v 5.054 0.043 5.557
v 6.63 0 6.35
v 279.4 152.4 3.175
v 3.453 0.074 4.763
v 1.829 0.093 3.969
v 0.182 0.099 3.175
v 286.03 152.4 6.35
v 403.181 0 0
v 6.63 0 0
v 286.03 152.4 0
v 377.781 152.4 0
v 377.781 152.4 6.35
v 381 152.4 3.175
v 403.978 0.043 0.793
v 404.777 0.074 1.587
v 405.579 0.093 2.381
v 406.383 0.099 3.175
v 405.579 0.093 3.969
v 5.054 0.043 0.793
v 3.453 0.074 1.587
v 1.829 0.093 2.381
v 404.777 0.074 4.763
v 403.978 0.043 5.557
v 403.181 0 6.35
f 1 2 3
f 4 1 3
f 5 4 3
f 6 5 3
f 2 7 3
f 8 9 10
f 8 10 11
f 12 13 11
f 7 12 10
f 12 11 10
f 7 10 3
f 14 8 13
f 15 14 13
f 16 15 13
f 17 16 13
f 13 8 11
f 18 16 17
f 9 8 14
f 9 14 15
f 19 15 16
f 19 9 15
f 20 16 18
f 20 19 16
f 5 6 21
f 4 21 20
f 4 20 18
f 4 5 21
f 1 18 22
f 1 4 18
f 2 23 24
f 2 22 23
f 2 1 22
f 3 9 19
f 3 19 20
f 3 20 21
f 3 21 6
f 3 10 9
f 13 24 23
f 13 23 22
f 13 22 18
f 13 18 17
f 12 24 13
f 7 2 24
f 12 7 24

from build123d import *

# Parameters (mm, degrees)
BOSS_EXTRUDE1_DEPTH     = 6.35
CHAMFER1_SIZE           = 3.175
CUT_EXTRUDE1_DEPTH      = 421.64
CUT_EXTRUDE1_DEPTH_BACK = 27.432
SKETCH2_R               = 50.8


with BuildPart() as part:
    # Sketch1 → Boss-Extrude1 (new body)
    with BuildSketch(Plane.XY):
        Polygon((279.4, 152.4), (0, 0), (279.4, 0), align=None)
        Polygon((279.4, 152.4), (279.4, 0), (406.4, 0), (381, 152.4), align=None)
    extrude(amount=BOSS_EXTRUDE1_DEPTH)

    # Chamfer1
    chamfer1_edges = [part.edges().sort_by_distance(p)[0] for p in [
        (393.7, 76.2, 6.35),
        (393.7, 76.2, 0),
        (139.7, 76.2, 0),
        (139.7, 76.2, 6.35),
    ]]
    chamfer(chamfer1_edges, length=CHAMFER1_SIZE - 0.0001)  # a hair under: the kernel refuses the full size

    # Sketch2 → Cut-Extrude1 (cut, two sides: drawn at the far end of the back side and taken through both)
    with BuildSketch(Plane(origin=(0, 0, 0), x_dir=(0, 0, -1), z_dir=(1, 0, 0)).offset(-CUT_EXTRUDE1_DEPTH_BACK)):
        with Locations((-3.175, -50.700684167)):
            Circle(SKETCH2_R)
    extrude(amount=CUT_EXTRUDE1_DEPTH + CUT_EXTRUDE1_DEPTH_BACK, mode=Mode.SUBTRACT)


solid = part.part
